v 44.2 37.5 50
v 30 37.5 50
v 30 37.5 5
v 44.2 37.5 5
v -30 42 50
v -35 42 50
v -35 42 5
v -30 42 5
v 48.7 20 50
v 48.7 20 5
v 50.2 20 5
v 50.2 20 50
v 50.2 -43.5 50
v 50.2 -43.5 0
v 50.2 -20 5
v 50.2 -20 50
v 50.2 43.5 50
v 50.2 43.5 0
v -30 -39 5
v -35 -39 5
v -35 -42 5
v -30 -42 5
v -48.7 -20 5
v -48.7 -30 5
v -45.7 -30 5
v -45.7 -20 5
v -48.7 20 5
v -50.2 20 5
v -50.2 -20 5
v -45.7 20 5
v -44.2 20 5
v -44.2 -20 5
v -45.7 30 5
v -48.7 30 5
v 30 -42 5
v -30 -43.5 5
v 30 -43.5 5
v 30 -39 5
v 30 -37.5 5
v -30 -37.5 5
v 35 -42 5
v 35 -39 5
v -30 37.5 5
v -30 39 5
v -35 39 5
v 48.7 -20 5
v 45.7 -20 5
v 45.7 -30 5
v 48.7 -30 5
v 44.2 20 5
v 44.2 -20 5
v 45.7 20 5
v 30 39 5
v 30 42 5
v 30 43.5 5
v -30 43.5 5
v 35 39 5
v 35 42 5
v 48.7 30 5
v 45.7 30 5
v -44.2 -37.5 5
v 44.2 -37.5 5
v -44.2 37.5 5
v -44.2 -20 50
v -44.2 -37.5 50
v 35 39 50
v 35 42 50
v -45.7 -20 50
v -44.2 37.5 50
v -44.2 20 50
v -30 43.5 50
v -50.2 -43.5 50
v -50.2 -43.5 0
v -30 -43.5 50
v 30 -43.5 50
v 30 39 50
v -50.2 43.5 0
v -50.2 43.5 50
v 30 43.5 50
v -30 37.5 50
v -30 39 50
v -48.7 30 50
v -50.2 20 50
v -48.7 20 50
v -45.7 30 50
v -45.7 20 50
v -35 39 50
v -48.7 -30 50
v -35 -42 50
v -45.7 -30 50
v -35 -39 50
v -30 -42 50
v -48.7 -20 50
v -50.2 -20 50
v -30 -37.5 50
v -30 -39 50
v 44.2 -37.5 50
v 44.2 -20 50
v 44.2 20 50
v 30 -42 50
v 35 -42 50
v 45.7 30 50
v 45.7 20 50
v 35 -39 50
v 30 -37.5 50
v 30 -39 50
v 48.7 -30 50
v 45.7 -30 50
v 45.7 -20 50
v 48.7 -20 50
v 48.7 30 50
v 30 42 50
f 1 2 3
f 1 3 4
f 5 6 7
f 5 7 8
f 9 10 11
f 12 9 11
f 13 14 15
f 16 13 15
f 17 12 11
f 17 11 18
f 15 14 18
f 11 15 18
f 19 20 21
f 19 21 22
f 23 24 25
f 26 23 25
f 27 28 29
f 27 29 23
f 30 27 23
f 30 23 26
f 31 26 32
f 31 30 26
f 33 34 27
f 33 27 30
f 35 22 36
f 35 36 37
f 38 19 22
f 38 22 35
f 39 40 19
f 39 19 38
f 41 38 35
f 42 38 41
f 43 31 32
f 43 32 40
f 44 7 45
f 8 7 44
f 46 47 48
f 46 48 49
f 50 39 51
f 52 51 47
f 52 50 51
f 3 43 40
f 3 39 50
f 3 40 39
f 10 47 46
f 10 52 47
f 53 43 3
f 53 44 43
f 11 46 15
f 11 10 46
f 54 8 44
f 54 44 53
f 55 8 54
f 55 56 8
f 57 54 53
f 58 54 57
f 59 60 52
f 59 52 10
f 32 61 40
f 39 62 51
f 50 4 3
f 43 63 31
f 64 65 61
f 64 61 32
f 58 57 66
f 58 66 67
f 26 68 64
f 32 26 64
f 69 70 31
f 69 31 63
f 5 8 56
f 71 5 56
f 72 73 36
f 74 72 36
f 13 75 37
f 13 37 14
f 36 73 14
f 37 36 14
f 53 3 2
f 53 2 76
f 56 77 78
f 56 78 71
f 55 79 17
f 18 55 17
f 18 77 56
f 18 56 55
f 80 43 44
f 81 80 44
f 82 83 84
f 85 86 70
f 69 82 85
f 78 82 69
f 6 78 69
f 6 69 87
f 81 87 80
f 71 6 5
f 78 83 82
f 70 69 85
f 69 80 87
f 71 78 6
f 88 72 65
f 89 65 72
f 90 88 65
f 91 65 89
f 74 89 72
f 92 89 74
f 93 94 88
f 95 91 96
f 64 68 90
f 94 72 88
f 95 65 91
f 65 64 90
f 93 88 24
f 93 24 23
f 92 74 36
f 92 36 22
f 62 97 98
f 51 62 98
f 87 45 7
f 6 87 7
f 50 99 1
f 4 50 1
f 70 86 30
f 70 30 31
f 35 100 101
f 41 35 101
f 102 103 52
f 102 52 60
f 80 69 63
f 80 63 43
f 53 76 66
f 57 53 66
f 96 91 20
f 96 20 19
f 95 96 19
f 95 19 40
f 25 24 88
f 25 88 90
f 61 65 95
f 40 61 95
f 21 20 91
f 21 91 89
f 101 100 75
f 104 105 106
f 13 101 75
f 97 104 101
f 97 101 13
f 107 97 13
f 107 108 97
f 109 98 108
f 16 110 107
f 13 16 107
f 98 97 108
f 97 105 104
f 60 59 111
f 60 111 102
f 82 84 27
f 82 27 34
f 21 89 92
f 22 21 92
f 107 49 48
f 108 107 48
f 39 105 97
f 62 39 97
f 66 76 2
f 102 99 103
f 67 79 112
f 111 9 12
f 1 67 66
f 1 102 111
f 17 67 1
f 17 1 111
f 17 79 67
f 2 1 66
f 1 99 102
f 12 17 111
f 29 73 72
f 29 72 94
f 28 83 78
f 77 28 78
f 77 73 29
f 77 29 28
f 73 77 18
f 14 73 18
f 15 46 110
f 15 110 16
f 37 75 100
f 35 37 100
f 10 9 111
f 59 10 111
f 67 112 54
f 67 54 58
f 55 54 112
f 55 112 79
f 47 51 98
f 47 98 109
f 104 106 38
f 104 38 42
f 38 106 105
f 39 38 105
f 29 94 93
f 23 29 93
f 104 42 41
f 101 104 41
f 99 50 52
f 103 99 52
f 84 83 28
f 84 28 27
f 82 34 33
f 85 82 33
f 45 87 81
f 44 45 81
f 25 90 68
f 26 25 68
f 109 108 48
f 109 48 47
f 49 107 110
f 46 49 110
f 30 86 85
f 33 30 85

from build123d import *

# Parameters (mm, degrees)
ESQUISSE1_W             = 100.4
ESQUISSE1_H             = 87
BOSS_EXTRU_1_DEPTH      = 50
ESQUISSE3_W             = 88.4
ESQUISSE3_H             = 75
ENL_V_MAT_EXTRU_1_DEPTH = 45
ESQUISSE5_W             = 3
ESQUISSE5_H             = 60
ENL_V_MAT_EXTRU_2_DEPTH = 45
ESQUISSE7_W             = 70
ESQUISSE7_H             = 3
ENL_V_MAT_EXTRU_3_DEPTH = 45
ESQUISSE8_W             = 100.4
ESQUISSE8_H             = 40
ENL_V_MAT_EXTRU_4_DEPTH = 45
ESQUISSE9_W             = 60
ESQUISSE9_H             = 87
ENL_V_MAT_EXTRU_5_DEPTH = 45


with BuildPart() as part:
    # Esquisse1 → Boss.-Extru.1 (new body)
    with BuildSketch(Plane.XY):
        Rectangle(ESQUISSE1_W, ESQUISSE1_H)
    extrude(amount=BOSS_EXTRU_1_DEPTH)

    # Esquisse3 → Enlèv. mat.-Extru.1 (cut)
    with BuildSketch(Plane.XY.offset(50)):
        Rectangle(ESQUISSE3_W, ESQUISSE3_H)
    extrude(amount=-ENL_V_MAT_EXTRU_1_DEPTH, mode=Mode.SUBTRACT)

    # Esquisse5 → Enlèv. mat.-Extru.2 (cut)
    with BuildSketch(Plane.XY.offset(50)):
        with Locations((-47.2, 0)):
            Rectangle(ESQUISSE5_W, ESQUISSE5_H)
    enl_v_mat_extru_2 = extrude(amount=-ENL_V_MAT_EXTRU_2_DEPTH, mode=Mode.SUBTRACT)

    # Symétrie1: Enlèv. mat.-Extru.2 across plane
    add(enl_v_mat_extru_2.mirror(Plane(origin=(0, 0, 0), x_dir=(0, 0, 1), z_dir=(1, 0, 0))), mode=Mode.SUBTRACT)

    # Esquisse7 → Enlèv. mat.-Extru.3 (cut)
    with BuildSketch(Plane.XY.offset(50)):
        with Locations((0, 40.5)):
            Rectangle(ESQUISSE7_W, ESQUISSE7_H)
    enl_v_mat_extru_3 = extrude(amount=-ENL_V_MAT_EXTRU_3_DEPTH, mode=Mode.SUBTRACT)

    # Symétrie2: Enlèv. mat.-Extru.3 across plane
    add(enl_v_mat_extru_3.mirror(Plane.ZX), mode=Mode.SUBTRACT)

    # Esquisse8 → Enlèv. mat.-Extru.4 (cut)
    with BuildSketch(Plane.XY.offset(50)):
        Rectangle(ESQUISSE8_W, ESQUISSE8_H)
    extrude(amount=-ENL_V_MAT_EXTRU_4_DEPTH, mode=Mode.SUBTRACT)

    # Esquisse9 → Enlèv. mat.-Extru.5 (cut)
    with BuildSketch(Plane.XY.offset(50)):
        Rectangle(ESQUISSE9_W, ESQUISSE9_H)
    extrude(amount=-ENL_V_MAT_EXTRU_5_DEPTH, mode=Mode.SUBTRACT)


solid = part.part
